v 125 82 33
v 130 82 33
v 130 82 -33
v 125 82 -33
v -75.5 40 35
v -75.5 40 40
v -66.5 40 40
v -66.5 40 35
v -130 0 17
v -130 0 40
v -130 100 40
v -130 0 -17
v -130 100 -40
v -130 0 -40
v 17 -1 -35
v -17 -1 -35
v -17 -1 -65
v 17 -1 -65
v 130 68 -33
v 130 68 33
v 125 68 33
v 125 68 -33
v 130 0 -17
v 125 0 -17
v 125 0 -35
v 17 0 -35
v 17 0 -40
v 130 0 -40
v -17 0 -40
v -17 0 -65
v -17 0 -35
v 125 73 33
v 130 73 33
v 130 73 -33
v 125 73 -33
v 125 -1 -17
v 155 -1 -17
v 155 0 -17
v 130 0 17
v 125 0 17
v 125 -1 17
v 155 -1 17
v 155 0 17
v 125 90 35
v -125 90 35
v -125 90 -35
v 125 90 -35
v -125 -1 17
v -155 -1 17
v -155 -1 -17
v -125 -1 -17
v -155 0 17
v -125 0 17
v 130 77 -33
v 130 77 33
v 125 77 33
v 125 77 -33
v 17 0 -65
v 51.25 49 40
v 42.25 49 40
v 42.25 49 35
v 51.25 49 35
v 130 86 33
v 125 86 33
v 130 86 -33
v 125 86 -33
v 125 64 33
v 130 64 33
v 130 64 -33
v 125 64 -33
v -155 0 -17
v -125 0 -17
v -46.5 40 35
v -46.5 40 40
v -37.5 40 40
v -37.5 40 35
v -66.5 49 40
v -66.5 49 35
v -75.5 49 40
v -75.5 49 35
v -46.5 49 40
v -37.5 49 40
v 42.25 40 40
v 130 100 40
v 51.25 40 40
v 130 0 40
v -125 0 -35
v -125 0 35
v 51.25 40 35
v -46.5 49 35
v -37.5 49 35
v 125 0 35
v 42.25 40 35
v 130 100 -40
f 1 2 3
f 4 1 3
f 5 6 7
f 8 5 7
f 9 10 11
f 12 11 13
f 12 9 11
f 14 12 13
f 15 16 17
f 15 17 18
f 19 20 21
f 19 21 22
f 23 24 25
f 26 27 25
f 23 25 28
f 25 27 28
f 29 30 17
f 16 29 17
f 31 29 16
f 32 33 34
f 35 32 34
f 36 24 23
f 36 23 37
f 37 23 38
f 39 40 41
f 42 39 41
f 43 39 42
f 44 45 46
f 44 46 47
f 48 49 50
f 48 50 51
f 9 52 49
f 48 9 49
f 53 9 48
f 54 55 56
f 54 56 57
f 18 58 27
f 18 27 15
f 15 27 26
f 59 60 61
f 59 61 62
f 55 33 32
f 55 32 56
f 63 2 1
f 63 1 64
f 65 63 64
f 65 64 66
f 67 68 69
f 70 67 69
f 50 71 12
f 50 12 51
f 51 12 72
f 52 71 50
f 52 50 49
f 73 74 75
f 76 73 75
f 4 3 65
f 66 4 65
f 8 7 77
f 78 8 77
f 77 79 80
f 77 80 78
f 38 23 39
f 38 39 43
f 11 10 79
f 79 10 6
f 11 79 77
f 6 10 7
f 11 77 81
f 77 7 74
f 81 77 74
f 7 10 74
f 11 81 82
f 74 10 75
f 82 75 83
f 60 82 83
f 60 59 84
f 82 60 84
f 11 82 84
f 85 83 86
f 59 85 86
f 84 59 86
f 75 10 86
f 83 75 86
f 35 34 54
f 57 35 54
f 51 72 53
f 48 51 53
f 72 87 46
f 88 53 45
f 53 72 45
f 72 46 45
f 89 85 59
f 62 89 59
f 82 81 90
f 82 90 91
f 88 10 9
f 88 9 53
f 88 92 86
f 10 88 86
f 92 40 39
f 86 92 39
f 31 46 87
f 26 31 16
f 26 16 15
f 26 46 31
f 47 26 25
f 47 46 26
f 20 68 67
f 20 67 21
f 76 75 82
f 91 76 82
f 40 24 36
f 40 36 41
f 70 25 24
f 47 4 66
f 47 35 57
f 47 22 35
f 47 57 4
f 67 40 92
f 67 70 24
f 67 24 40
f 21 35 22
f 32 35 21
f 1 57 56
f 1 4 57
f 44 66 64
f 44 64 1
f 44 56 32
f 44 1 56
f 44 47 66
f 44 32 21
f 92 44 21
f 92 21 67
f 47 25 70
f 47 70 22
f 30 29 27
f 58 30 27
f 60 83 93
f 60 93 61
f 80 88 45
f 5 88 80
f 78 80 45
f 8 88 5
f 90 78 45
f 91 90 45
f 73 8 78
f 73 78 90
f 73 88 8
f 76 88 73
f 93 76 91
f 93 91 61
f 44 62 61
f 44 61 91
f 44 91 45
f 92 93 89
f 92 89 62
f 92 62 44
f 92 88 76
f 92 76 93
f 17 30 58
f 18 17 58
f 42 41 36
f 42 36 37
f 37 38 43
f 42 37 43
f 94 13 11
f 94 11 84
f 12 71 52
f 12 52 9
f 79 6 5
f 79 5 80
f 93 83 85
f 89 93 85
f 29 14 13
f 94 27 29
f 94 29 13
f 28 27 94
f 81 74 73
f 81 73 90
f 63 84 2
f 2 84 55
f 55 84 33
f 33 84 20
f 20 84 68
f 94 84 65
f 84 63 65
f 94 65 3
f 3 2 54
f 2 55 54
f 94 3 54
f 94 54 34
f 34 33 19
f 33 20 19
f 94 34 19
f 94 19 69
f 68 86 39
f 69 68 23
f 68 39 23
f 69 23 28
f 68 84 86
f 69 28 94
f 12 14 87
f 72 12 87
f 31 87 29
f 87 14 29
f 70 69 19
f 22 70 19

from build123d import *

# Parameters (mm, degrees)
SKETCH1_W                 = 260
SKETCH1_H                 = 80
BOSS_EXTRUDE1_DEPTH       = 100
SKETCH2_W                 = 250
SKETCH2_H                 = 70.000000188
INSIDE_DEPTH              = 90
SKETCH8_W                 = 9
SKETCH8_H                 = 9
WIRE_HOLES_DEPTH          = 23
SKETCH12_W                = 66
SKETCH12_H                = 4
VENTALATION_DEPTH         = 15
SKETCH14_W                = 66
SKETCH14_H                = 4
VENTALATION_2_DEPTH       = 10
SKETCH16_W                = 66
SKETCH16_H                = 4
VENTALATION_3_DEPTH       = 10
SKETCH20_W                = 34
SKETCH20_H                = 30
COMMAND_STRIP_FRONT_DEPTH = 1
SKETCH21_W                = 30
SKETCH21_H                = 34.000000188
COMMAND_STRIP_RIGHT_DEPTH = 1
SKETCH22_W                = 30
SKETCH22_H                = 34.000000188
BOSS_EXTRUDE4_DEPTH       = 1


with BuildPart() as part:
    # Sketch1 → Boss-Extrude1 (new body)
    with BuildSketch(Plane(origin=(0, 0, 0), x_dir=(1, 0, 0), z_dir=(0, 1, 0))):
        Rectangle(SKETCH1_W, SKETCH1_H)
    extrude(amount=BOSS_EXTRUDE1_DEPTH)

    # Sketch2 → inside (cut)
    with BuildSketch(Plane.XZ):
        Rectangle(SKETCH2_W, SKETCH2_H)
    extrude(amount=-INSIDE_DEPTH, mode=Mode.SUBTRACT)

    # Sketch8 → Wire holes (cut)
    with BuildSketch(Plane.XY.offset(40)):
        with Locations((-71, 44.5)):
            Rectangle(SKETCH8_W, SKETCH8_H)
        with Locations((-42, 44.5)):
            Rectangle(SKETCH8_W, SKETCH8_H)
        with Locations((46.75, 44.5)):
            Rectangle(SKETCH8_W, SKETCH8_H)
    extrude(amount=-WIRE_HOLES_DEPTH, mode=Mode.SUBTRACT)

    # Sketch12 → Ventalation (cut)
    with BuildSketch(Plane(origin=(130, 0, 0), x_dir=(0, 0, -1), z_dir=(1, 0, 0))):
        with Locations((0, 84)):
            Rectangle(SKETCH12_W, SKETCH12_H)
    extrude(amount=-VENTALATION_DEPTH, mode=Mode.SUBTRACT)

    # Sketch14 → Ventalation 2 (cut)
    with BuildSketch(Plane(origin=(130, 0, 0), x_dir=(0, 0, -1), z_dir=(1, 0, 0))):
        with Locations((0, 75)):
            Rectangle(SKETCH14_W, SKETCH14_H)
    extrude(amount=-VENTALATION_2_DEPTH, mode=Mode.SUBTRACT)

    # Sketch16 → Ventalation 3 (cut)
    with BuildSketch(Plane(origin=(130, 0, 0), x_dir=(0, 0, -1), z_dir=(1, 0, 0))):
        with Locations((0, 66)):
            Rectangle(SKETCH16_W, SKETCH16_H)
    extrude(amount=-VENTALATION_3_DEPTH, mode=Mode.SUBTRACT)

    # Sketch20 → Command Strip front (add)
    with BuildSketch(Plane.XZ):
        with Locations((0, -50.000000094)):
            Rectangle(SKETCH20_W, SKETCH20_H)
    extrude(amount=COMMAND_STRIP_FRONT_DEPTH)

    # Sketch21 → Command strip right (add)
    with BuildSketch(Plane.XZ):
        with Locations((-140, 0)):
            Rectangle(SKETCH21_W, SKETCH21_H)
    extrude(amount=COMMAND_STRIP_RIGHT_DEPTH)

    # Sketch22 → Boss-Extrude4 (add)
    with BuildSketch(Plane.XZ):
        with Locations((140, 0)):
            Rectangle(SKETCH22_W, SKETCH22_H)
    extrude(amount=BOSS_EXTRUDE4_DEPTH)


solid = part.part
